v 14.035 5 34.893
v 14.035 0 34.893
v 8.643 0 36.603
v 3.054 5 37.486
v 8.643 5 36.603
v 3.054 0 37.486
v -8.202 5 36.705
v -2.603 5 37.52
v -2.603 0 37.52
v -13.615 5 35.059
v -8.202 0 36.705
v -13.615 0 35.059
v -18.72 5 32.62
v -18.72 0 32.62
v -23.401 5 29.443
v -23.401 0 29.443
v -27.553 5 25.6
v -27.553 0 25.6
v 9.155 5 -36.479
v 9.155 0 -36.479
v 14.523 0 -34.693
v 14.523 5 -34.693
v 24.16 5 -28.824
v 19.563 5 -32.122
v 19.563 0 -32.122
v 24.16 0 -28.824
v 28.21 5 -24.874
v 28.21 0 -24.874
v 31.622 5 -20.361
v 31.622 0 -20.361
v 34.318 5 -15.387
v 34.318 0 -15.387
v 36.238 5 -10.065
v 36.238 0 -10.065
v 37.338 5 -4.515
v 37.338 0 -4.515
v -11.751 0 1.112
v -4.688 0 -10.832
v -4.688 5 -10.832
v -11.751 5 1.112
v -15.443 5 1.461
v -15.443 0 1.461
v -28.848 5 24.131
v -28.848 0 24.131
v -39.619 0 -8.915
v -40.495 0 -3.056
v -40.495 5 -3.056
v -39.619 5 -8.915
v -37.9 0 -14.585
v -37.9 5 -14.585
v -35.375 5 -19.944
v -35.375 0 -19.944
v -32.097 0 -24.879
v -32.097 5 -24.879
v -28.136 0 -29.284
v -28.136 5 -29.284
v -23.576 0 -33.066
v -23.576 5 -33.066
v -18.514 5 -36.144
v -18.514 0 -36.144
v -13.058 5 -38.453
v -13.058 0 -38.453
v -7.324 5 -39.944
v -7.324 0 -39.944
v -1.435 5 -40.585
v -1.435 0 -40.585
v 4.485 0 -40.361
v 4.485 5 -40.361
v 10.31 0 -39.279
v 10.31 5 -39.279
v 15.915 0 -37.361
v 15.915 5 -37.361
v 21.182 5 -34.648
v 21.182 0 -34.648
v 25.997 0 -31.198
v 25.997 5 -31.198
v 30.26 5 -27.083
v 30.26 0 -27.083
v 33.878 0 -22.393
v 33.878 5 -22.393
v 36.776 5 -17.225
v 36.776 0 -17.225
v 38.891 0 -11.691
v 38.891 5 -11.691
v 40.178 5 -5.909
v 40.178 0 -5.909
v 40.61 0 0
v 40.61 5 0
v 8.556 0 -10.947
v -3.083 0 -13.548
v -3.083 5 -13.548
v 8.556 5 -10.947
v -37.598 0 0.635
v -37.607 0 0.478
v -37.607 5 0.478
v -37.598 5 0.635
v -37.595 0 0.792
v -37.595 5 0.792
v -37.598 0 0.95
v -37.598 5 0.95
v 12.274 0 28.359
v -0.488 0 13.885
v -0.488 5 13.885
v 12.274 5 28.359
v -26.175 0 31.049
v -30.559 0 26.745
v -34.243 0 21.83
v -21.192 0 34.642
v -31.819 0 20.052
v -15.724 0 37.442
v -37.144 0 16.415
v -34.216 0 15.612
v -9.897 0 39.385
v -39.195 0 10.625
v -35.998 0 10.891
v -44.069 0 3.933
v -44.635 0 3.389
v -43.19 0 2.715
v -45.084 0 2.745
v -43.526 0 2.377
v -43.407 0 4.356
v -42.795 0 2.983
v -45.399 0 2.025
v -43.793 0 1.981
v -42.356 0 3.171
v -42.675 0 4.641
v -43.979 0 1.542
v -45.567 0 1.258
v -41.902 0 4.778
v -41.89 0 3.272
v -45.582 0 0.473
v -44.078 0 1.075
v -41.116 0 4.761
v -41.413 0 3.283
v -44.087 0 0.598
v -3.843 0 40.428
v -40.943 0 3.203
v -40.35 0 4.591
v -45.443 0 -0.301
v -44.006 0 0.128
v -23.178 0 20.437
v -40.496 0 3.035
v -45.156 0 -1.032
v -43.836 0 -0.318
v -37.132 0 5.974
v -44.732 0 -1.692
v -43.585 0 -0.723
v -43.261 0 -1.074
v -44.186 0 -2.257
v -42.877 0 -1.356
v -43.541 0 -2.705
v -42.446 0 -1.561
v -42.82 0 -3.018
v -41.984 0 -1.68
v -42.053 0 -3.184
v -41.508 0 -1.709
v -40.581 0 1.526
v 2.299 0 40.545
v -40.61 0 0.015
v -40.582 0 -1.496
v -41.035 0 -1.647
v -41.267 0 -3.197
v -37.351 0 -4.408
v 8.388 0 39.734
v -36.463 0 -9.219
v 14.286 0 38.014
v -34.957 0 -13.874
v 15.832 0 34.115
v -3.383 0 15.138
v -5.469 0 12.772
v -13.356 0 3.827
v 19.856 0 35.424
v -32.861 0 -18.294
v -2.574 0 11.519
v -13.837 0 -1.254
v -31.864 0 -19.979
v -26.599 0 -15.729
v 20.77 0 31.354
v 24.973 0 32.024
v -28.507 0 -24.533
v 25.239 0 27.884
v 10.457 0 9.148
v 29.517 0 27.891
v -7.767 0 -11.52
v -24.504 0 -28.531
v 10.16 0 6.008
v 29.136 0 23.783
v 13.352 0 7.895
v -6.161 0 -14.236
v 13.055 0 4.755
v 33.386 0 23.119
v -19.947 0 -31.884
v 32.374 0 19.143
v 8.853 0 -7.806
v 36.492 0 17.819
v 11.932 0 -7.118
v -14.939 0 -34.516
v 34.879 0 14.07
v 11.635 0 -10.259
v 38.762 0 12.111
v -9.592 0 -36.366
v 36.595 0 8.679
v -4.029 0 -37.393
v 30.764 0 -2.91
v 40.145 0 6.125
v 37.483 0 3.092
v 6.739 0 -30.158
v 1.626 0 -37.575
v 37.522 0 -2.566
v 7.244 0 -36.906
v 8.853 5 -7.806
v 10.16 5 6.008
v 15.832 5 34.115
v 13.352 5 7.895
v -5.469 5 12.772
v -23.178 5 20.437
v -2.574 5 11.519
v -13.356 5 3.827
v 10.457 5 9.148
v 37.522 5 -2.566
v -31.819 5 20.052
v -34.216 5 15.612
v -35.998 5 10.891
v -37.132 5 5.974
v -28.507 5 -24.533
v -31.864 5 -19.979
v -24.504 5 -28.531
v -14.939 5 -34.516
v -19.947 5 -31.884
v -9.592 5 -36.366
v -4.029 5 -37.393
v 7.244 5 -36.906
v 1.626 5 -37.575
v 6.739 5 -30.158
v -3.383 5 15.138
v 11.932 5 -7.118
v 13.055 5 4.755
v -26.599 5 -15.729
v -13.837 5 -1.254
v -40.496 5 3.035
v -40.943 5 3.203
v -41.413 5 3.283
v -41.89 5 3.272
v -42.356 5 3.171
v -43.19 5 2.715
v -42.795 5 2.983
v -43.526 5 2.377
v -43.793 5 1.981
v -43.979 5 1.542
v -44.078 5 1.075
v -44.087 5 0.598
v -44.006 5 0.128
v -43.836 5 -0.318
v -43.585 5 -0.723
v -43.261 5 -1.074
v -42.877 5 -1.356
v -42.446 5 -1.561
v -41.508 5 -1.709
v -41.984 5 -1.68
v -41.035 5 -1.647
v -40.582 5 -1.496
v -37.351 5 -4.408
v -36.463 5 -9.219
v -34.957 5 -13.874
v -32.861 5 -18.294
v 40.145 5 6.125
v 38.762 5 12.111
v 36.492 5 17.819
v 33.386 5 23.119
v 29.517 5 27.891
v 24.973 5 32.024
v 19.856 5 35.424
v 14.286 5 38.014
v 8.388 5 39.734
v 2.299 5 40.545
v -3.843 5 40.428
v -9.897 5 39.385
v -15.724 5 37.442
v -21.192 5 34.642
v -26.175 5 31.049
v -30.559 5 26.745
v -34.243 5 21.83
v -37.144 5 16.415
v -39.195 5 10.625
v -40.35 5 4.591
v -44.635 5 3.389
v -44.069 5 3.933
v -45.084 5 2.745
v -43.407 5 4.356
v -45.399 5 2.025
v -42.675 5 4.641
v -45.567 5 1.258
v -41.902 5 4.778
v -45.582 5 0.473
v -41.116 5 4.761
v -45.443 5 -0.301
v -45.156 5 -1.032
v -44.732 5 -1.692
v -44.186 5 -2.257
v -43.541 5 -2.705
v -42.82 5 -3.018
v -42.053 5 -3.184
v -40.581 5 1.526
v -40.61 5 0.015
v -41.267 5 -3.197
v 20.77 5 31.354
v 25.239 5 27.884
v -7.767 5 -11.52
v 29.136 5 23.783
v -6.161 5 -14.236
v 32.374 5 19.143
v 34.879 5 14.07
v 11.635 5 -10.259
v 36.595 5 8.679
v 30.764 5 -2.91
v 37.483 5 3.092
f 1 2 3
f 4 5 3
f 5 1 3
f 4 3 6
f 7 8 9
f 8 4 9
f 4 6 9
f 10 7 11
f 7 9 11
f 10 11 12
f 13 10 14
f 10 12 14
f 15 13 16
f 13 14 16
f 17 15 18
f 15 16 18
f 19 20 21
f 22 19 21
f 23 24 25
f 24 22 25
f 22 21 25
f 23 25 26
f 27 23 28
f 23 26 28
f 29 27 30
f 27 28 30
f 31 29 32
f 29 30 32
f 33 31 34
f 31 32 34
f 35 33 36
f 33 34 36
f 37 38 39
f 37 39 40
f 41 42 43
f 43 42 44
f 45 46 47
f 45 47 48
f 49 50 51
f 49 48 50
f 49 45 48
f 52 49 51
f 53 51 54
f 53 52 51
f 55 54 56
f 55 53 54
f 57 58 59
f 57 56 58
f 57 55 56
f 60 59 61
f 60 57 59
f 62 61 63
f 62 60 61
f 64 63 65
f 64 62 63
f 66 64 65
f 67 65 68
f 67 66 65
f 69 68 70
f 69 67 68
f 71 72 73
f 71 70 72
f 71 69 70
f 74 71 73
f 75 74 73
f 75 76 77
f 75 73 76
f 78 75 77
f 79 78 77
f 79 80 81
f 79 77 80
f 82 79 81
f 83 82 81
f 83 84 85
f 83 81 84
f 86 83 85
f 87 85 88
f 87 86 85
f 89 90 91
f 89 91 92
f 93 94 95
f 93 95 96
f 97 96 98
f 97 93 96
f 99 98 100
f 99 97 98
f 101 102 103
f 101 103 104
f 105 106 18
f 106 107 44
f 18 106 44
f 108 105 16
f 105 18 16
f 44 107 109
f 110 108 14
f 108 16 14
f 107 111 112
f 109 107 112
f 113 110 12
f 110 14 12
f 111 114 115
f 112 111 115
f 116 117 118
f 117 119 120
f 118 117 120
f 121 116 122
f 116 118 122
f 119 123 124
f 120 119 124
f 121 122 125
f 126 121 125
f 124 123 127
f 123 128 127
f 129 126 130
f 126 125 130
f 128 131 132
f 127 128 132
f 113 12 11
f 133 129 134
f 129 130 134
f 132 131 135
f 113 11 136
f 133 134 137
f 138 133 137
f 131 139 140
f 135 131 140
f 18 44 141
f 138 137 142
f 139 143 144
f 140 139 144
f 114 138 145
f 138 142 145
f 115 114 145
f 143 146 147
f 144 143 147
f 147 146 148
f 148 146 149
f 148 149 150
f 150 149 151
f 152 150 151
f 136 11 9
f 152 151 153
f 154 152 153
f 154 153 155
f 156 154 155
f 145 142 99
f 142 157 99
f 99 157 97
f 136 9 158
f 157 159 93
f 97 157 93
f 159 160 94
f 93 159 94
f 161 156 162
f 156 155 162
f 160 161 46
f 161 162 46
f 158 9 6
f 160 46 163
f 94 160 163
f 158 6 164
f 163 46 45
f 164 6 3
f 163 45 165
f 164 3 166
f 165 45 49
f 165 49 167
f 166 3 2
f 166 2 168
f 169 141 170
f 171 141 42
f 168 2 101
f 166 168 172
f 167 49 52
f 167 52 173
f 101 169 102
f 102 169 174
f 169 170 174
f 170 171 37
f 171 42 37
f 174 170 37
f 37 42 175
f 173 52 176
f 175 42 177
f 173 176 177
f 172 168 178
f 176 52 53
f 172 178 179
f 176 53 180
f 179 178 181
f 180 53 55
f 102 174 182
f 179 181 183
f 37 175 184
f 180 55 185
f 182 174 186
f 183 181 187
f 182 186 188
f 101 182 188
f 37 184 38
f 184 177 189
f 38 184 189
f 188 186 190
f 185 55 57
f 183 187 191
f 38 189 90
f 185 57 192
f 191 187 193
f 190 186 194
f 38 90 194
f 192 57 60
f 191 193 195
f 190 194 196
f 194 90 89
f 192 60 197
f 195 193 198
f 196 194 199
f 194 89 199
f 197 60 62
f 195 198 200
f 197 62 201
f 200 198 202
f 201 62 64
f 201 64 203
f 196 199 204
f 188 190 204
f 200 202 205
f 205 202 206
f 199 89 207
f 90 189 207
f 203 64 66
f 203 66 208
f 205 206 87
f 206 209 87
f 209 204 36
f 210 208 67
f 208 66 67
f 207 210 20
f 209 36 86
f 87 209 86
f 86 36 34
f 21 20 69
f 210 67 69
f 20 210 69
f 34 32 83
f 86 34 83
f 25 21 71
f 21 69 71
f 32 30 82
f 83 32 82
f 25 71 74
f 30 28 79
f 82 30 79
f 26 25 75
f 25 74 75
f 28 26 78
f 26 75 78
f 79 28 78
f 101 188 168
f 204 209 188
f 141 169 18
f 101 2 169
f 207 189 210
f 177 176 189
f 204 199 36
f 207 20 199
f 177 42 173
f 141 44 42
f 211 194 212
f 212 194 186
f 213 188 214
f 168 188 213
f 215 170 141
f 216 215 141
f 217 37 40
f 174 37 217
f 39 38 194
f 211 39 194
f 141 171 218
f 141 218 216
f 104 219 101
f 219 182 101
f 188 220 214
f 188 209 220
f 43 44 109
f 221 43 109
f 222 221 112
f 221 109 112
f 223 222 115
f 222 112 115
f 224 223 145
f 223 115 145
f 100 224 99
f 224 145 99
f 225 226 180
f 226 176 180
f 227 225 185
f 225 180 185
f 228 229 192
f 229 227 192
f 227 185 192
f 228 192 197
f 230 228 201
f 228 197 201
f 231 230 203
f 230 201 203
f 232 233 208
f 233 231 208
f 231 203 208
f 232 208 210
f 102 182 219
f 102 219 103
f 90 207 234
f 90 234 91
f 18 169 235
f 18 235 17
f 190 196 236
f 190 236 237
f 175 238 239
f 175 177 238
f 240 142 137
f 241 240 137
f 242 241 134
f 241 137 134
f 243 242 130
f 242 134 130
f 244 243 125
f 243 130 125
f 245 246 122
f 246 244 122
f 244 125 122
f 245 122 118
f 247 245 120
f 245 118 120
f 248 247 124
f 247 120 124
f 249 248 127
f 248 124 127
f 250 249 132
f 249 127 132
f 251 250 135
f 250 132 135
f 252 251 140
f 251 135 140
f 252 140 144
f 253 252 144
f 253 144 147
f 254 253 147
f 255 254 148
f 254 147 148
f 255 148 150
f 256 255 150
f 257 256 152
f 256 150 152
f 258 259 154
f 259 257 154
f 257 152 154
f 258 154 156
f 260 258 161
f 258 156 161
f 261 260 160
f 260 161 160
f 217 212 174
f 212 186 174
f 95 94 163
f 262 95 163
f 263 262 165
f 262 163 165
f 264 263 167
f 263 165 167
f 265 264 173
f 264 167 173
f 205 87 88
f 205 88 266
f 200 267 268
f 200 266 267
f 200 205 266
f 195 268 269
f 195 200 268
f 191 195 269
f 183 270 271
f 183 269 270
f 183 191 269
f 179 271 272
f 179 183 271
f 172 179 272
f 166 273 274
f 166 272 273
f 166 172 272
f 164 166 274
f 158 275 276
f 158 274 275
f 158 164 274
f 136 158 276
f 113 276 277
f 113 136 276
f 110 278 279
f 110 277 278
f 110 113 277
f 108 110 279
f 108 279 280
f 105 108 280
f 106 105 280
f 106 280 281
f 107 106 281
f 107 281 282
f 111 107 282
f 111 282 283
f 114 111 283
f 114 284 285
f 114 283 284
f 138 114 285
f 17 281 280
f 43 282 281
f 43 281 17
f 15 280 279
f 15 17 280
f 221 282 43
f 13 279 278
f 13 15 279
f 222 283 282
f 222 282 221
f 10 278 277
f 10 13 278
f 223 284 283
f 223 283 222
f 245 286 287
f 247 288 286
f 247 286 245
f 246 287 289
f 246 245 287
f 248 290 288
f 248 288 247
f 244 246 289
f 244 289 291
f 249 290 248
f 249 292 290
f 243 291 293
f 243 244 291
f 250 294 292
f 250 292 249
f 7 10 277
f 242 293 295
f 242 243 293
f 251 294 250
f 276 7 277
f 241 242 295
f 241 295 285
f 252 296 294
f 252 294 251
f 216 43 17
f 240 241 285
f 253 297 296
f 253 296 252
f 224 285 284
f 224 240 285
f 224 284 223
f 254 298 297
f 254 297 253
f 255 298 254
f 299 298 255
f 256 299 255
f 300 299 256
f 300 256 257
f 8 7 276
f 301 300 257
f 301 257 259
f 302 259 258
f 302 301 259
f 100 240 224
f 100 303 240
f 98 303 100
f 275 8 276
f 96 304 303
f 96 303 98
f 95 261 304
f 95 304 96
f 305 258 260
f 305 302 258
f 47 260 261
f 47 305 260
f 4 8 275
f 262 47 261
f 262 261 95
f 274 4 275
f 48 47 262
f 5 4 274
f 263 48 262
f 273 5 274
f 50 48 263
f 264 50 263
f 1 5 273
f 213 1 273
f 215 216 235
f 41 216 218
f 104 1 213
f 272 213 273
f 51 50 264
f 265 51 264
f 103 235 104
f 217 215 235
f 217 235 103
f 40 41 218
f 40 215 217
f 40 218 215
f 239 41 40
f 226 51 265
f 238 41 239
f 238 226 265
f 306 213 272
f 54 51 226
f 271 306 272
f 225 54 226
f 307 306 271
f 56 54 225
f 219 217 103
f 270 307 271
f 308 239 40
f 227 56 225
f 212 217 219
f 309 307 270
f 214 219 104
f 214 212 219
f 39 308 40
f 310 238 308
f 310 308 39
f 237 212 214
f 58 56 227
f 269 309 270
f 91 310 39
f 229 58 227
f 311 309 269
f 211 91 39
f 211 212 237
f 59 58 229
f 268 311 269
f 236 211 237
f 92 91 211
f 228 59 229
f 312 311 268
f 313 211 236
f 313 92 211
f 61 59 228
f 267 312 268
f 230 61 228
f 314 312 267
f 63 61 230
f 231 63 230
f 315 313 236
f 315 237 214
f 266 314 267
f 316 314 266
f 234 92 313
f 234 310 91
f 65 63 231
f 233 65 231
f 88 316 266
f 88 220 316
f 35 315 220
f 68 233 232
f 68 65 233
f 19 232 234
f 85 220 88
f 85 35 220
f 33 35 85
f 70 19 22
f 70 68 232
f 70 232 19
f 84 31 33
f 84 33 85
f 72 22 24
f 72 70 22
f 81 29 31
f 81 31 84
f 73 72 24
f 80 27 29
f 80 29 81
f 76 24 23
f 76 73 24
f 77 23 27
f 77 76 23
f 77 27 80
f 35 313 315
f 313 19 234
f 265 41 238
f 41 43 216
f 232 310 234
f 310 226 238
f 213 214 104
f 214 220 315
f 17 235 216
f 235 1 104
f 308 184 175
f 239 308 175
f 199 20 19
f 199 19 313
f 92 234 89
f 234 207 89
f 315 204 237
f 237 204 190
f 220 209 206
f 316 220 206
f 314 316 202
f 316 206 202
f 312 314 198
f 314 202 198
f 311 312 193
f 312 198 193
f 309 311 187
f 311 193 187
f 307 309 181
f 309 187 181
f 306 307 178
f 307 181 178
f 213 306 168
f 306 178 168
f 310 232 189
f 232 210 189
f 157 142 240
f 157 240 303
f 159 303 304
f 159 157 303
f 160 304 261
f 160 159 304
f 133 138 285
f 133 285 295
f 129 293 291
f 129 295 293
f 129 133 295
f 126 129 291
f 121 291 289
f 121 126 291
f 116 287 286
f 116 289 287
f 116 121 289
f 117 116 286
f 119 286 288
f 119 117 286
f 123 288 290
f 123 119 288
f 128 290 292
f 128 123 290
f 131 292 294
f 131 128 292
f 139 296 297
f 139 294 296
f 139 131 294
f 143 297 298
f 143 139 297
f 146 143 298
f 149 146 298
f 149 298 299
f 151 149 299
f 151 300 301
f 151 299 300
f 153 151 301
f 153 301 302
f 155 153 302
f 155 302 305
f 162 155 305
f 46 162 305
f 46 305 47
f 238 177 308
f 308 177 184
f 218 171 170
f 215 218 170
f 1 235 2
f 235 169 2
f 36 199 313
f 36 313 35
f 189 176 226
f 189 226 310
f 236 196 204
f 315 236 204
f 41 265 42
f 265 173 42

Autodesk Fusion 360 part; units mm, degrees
sketch "草图1" plane through (0, 0, 0) normal (0, 1, 0) x (1, 0, 0)
sketch "草图2" plane through (0, 0, 0) normal (0, 1, 0) x (1, 0, 0)
  circle A0 centre (0, 0) radius 40.6099
  arc A1 (-32.8609, 18.2939) -> (-28.8479, -24.131) centre (0, 0) ccw
  arc A2 (7.2439, 36.9057) -> (-31.8644, 19.9791) centre (0, 0) ccw
  arc A3 (37.3379, 4.5151) -> (9.1546, 36.4787) centre (0, 0) ccw
  arc A4 (-27.5531, -25.5995) -> (14.0354, -34.8929) centre (0, 0) ccw
  arc A5 (15.8322, -34.1152) -> (37.5223, 2.566) centre (0, 0) ccw
  line L0 (-31.8644, 19.9791) -> (-6.1613, 14.2355)
  line L1 (-26.5994, 15.7286) -> (-7.7668, 11.5202)
  line L2 (-13.3565, -3.8268) -> (-23.1784, -20.4371)
  line L3 (-15.4427, -1.4607) -> (-28.8479, -24.131)
  line L4 (-3.3828, -15.1382) -> (14.0354, -34.8929)
  line L5 (-0.4879, -13.8853) -> (12.2743, -28.3594)
  line L6 (-26.5994, 15.7286) -> (-13.8371, 1.2545)
  line L7 (-11.7509, -1.1115) -> (-2.5741, -11.5193)
  line L8 (-32.8609, 18.2939) -> (-15.4427, -1.4607)
  line L9 (-13.3565, -3.8268) -> (-5.469, -12.7722)
  line L10 (-3.3828, -15.1382) -> (-27.5531, -25.5995)
  line L11 (-5.469, -12.7722) -> (-23.1784, -20.4371)
  line L12 (10.4571, -9.1481) -> (12.2743, -28.3594)
  line L13 (13.352, -7.8952) -> (15.8322, -34.1152)
  line L14 (30.7644, 2.91) -> (13.0549, -4.7548)
  line L15 (10.1601, -6.0078) -> (-2.5741, -11.5193)
  line L16 (37.5223, 2.566) -> (13.352, -7.8952)
  line L17 (10.4571, -9.1481) -> (-0.4879, -13.8853)
  line L18 (-4.6884, 10.8323) -> (8.8534, 7.8063)
  line L19 (11.9318, 7.1184) -> (30.7644, 2.91)
  line L20 (-3.0828, 13.5475) -> (8.5563, 10.9467)
  line L21 (11.6348, 10.2587) -> (37.3379, 4.5151)
  line L22 (6.7391, 30.1579) -> (8.5563, 10.9467)
  line L23 (8.8534, 7.8063) -> (10.1601, -6.0078)
  line L24 (9.1546, 36.4787) -> (11.6348, 10.2587)
  line L25 (11.9318, 7.1184) -> (13.0549, -4.7548)
  line L26 (6.7391, 30.1579) -> (-3.0828, 13.5475)
  line L27 (-4.6884, 10.8323) -> (-11.7509, -1.1115)
  line L28 (7.2439, 36.9057) -> (-6.1613, 14.2355)
  line L29 (-7.7668, 11.5202) -> (-13.8371, 1.2545)
extrude "拉伸1" add sketch "草图2" along normal blind 5 makes body 1
sketch "草图3" plane through (0, 0, 0) normal (0, 1, 0) x (1, 0, 0)
  circle A0 centre (-95, 0) radius 2.5
  circle A1 centre (-95, 0) radius 4
  dimension "d6" = 5
  dimension "d7" = 8
extrude "拉伸2" add sketch "草图3" along normal blind 5 separate body makes body 2
move_body "移动1" bodies 2 to x (1, 0, 0) y (0, 1, 0) z (0, 0, 1) at (54.5157, 0, 0.7678)
move_body "移动2" bodies 2 to x (1, 0, 0) y (0, 1, 0) z (0, 0, 1) at (-1.1104, 0, 0.0218)
combine "合并1" operation add target body 1 tool bodies 2
